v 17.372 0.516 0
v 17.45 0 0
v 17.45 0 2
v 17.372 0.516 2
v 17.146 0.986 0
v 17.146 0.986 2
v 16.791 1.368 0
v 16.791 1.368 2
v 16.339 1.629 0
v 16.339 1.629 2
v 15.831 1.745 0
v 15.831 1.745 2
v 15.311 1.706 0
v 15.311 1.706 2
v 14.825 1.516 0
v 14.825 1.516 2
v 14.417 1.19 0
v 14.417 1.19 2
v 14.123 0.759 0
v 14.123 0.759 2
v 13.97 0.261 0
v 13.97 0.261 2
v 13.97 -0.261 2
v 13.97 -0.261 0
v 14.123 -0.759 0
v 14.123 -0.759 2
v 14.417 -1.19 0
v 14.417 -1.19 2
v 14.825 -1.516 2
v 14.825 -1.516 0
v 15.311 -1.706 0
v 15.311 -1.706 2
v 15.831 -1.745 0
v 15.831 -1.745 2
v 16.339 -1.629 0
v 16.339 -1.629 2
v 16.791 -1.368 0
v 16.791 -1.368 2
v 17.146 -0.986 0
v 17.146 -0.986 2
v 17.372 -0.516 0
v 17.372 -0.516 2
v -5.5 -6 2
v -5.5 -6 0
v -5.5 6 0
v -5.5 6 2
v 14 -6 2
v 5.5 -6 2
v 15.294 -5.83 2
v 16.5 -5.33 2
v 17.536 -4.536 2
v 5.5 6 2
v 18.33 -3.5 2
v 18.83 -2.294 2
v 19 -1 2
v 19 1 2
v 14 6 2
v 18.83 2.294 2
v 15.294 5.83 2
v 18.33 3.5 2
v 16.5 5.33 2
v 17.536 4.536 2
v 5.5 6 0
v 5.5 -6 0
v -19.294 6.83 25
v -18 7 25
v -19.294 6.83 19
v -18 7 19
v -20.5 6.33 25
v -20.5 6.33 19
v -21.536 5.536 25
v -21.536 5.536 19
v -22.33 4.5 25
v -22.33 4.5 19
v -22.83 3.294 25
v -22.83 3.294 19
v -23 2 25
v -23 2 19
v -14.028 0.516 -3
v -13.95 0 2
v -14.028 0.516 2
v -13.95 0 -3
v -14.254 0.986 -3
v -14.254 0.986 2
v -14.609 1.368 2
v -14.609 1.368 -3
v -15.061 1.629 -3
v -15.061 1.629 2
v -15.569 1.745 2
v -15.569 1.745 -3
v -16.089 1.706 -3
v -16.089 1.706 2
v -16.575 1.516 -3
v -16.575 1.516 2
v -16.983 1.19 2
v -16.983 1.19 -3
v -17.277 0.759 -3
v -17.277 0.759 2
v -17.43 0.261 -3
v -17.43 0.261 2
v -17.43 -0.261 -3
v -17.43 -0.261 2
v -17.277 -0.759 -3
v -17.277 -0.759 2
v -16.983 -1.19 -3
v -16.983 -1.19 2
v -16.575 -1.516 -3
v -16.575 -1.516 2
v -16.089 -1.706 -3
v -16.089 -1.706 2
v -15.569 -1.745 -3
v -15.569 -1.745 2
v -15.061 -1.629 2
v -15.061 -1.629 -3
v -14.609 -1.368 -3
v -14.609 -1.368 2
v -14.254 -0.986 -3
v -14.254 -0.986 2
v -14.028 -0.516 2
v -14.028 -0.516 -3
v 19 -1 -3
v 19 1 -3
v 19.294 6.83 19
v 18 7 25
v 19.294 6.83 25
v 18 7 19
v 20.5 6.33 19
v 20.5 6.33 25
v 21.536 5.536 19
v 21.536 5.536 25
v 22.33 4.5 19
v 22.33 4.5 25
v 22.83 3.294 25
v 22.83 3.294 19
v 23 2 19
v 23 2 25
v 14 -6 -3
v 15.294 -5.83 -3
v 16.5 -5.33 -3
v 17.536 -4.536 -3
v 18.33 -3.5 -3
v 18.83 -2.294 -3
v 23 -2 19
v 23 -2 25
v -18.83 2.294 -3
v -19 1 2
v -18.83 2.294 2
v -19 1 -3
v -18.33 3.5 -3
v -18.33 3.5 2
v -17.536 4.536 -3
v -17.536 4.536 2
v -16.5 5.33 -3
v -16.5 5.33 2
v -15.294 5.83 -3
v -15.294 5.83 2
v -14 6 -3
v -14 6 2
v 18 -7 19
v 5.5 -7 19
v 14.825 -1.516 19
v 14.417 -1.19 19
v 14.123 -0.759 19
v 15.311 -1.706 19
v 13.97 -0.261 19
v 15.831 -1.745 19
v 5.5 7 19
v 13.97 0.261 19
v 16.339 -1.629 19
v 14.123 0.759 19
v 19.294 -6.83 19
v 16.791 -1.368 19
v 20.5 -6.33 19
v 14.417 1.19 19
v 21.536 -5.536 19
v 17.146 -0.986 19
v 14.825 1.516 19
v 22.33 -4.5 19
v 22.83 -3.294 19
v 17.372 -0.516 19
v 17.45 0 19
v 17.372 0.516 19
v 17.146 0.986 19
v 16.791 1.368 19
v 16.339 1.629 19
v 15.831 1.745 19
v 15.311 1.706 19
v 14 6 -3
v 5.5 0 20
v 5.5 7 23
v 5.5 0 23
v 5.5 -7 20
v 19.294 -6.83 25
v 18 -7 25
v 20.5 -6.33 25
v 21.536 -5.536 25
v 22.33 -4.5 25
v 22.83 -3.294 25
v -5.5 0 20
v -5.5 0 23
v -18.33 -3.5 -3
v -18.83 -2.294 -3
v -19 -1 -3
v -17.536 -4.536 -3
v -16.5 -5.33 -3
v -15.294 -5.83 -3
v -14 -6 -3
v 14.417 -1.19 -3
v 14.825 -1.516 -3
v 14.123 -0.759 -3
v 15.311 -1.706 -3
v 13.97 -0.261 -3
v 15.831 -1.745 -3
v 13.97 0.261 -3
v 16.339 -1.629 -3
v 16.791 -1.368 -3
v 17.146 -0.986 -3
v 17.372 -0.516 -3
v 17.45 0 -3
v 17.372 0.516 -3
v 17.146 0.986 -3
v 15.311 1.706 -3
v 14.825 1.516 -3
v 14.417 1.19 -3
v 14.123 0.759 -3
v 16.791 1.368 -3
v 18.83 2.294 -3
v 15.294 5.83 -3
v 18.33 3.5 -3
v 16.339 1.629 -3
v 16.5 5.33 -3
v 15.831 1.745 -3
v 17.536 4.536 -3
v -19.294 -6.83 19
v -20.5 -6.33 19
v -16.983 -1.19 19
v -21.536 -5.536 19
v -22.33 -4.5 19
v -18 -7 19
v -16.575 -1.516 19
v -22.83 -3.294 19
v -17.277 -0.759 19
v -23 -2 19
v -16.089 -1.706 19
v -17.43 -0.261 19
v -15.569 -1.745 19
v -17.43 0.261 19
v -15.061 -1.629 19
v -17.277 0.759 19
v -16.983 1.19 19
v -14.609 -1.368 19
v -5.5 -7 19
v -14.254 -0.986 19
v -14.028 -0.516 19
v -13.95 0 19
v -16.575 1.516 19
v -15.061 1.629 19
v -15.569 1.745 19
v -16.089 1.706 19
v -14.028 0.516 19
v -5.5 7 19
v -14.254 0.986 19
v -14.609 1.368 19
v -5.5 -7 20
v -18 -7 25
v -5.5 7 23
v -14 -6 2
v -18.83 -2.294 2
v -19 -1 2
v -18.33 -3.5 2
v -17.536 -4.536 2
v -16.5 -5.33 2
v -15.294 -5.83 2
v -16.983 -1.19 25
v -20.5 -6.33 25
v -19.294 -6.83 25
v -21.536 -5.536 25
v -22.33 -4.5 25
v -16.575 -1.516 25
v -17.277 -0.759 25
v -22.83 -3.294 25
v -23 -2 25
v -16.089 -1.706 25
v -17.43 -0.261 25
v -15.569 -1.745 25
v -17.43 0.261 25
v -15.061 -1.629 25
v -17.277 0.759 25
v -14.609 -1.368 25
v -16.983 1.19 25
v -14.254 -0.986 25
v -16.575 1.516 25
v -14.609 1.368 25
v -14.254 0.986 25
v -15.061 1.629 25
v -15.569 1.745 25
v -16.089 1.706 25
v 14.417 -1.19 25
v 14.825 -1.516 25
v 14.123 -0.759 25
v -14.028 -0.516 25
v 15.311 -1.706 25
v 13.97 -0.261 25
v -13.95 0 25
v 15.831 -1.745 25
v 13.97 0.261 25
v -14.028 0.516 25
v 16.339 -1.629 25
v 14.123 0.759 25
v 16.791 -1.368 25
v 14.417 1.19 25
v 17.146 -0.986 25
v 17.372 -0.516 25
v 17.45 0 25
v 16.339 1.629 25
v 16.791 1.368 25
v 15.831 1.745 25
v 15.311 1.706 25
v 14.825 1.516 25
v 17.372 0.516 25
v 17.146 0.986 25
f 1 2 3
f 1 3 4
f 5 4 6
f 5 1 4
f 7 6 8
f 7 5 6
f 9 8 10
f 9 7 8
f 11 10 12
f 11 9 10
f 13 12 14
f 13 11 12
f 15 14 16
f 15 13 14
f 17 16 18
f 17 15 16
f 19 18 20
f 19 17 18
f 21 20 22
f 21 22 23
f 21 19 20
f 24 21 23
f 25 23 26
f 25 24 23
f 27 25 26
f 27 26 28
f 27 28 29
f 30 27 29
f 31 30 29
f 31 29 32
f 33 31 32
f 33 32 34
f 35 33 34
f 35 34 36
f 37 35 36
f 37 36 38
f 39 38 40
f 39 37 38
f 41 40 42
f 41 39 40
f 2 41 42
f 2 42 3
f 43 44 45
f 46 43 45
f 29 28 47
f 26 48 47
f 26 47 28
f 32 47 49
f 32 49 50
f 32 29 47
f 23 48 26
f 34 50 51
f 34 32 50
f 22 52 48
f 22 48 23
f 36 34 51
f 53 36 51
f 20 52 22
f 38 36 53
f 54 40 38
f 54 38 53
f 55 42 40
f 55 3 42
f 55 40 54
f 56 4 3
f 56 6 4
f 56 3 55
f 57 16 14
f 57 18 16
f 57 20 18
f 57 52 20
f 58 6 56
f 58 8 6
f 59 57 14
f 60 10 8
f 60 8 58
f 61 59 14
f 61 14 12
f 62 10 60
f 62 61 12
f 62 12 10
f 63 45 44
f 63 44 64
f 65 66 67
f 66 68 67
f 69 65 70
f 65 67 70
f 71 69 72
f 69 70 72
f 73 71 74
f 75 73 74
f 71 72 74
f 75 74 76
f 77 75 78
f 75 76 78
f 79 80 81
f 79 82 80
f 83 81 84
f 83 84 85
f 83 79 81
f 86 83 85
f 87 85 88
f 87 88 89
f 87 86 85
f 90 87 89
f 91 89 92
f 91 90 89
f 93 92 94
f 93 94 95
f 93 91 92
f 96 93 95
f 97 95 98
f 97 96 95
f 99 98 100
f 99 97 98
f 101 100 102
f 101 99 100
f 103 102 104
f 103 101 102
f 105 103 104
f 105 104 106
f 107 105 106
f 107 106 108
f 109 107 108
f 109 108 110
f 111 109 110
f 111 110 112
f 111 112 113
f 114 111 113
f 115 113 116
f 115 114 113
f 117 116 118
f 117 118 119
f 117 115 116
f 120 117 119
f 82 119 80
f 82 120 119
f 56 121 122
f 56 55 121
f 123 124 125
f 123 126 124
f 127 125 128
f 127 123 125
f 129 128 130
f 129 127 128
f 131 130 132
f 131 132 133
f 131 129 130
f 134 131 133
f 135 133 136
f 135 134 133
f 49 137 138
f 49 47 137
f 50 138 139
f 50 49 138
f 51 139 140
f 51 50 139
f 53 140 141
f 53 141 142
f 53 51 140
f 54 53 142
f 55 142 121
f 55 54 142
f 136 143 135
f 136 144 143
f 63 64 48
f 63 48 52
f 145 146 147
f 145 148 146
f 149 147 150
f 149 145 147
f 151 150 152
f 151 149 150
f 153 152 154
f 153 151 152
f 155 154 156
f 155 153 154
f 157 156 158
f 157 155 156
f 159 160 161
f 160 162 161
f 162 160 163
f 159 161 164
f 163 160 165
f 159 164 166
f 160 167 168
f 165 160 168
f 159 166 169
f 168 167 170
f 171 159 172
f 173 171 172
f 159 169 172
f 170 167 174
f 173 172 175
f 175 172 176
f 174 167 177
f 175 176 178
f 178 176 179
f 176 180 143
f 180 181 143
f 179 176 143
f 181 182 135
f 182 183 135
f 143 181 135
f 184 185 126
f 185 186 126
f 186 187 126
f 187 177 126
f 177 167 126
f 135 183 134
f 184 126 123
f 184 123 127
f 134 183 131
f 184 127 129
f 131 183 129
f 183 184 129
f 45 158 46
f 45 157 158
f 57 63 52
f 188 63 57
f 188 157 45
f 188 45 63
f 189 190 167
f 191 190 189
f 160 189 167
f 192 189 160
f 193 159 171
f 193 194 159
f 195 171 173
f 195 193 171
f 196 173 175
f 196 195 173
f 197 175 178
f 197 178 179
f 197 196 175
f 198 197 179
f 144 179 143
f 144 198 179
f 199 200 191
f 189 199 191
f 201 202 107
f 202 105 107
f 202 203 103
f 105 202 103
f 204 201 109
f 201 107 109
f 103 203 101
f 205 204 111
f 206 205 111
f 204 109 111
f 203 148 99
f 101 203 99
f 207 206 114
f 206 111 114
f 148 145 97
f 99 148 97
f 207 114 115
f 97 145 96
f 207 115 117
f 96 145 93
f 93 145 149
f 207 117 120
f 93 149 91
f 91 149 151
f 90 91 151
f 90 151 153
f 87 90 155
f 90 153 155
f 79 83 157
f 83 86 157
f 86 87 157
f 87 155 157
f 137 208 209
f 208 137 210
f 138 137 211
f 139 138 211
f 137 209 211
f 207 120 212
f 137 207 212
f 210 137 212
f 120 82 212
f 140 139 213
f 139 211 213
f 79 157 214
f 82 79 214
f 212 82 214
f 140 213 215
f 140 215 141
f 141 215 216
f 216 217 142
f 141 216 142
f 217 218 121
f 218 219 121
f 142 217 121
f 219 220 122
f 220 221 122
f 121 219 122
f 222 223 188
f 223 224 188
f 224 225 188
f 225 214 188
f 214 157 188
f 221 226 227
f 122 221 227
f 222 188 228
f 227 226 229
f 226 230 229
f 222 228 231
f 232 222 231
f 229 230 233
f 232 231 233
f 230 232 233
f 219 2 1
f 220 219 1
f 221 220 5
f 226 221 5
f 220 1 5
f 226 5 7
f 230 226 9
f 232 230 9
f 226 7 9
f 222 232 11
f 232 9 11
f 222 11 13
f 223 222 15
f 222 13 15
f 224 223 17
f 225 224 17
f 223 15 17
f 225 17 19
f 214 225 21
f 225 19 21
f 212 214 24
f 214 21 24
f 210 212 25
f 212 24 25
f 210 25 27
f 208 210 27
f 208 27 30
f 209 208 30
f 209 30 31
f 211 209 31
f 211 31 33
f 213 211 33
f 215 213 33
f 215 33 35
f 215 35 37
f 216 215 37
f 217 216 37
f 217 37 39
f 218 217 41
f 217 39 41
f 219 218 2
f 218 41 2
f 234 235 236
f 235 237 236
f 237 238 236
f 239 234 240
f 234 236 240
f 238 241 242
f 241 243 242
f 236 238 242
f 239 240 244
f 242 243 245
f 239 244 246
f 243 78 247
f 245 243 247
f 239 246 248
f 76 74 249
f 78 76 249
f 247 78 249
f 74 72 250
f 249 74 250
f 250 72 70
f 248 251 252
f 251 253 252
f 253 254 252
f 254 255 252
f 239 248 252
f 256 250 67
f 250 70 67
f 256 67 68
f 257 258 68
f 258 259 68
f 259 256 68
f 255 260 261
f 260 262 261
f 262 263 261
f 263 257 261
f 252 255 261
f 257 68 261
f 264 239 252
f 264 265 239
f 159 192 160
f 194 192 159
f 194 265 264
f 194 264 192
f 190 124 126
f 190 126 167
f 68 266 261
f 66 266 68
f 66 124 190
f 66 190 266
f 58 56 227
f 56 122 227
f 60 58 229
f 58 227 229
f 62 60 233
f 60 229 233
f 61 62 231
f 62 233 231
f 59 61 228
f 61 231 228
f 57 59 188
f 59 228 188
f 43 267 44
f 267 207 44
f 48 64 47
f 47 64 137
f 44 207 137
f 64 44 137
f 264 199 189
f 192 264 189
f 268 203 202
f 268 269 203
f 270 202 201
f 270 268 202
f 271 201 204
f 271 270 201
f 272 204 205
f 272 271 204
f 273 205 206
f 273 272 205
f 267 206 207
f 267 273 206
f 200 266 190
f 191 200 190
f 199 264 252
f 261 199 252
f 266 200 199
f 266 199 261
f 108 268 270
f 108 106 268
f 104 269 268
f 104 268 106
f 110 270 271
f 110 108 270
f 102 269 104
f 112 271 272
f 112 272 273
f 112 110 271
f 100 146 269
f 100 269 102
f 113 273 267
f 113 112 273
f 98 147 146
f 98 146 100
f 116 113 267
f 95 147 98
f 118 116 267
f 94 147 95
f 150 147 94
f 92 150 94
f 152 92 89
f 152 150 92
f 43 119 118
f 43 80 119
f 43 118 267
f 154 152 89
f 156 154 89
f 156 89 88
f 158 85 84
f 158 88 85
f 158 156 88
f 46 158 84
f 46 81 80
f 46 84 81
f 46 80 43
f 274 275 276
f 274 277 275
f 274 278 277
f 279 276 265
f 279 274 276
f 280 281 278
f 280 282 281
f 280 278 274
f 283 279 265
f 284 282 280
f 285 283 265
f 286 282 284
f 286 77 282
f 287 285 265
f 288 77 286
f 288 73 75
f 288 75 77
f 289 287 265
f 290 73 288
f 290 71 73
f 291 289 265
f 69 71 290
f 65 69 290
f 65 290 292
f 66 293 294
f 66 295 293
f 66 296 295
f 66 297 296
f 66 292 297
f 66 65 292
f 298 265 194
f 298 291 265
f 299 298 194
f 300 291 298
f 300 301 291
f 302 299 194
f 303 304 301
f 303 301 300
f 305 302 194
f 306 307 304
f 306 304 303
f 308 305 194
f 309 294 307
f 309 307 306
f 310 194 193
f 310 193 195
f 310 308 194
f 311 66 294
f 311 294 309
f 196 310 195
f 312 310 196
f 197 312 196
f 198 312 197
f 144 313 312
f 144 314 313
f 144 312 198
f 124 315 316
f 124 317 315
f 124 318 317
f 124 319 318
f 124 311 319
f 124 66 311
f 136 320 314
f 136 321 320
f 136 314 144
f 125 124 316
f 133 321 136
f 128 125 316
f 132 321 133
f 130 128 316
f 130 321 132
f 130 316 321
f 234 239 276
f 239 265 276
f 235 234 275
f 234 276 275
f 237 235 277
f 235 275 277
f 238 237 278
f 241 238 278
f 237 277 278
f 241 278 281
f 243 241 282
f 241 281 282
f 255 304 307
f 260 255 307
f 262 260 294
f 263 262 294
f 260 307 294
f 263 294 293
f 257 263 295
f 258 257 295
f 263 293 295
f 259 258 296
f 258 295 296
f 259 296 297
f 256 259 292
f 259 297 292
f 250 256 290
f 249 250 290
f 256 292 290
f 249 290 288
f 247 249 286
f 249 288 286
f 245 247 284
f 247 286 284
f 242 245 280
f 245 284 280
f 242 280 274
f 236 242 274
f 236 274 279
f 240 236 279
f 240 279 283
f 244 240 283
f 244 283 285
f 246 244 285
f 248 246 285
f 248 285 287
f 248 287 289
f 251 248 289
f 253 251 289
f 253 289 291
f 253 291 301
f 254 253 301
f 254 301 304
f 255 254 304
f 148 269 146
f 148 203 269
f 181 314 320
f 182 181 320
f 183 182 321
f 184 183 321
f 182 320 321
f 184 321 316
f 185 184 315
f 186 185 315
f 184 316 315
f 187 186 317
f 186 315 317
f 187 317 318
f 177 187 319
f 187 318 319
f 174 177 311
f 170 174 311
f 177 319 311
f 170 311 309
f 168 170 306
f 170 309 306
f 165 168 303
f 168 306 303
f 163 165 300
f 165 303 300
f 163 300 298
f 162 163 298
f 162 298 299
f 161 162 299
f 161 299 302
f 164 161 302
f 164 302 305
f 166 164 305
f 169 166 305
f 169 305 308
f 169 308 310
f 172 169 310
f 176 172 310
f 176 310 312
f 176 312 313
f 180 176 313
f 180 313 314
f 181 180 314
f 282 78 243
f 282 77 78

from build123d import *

# Parameters (mm, degrees)
F0_W     = 13.5
F0_H     = 12
F0_R     = 1.75
F0_W_2   = 11
F1_DEPTH = 3
F2_DEPTH = 2
F4_R     = 1.75
F4_W     = 11
F4_H     = 7
F5_DEPTH = 2
F6_DEPTH = 6
F7_DEPTH = 5
F8_R     = 5
F8_2_R   = 5


with BuildPart() as f1:
    # F0 (on Top) → F1 (new body)
    with BuildSketch(Plane.XY):
        with Locations((-12.25, 0)):
            Rectangle(F0_W, F0_H)
        with Locations((-15.7, 0)):
            Circle(F0_R, mode=Mode.SUBTRACT)
        Rectangle(F0_W_2, F0_H)
        with Locations((12.25, 0)):
            Rectangle(F0_W, F0_H)
        with Locations((15.7, 0)):
            Circle(F0_R, mode=Mode.SUBTRACT)
    extrude(amount=-F1_DEPTH)

    # F0 (on Top) → F2 (join)
    with BuildSketch(Plane.XY):
        with Locations((-12.25, 0)):
            Rectangle(F0_W, F0_H)
        with Locations((-15.7, 0)):
            Circle(F0_R, mode=Mode.SUBTRACT)
        with Locations((12.25, 0)):
            Rectangle(F0_W, F0_H)
        with Locations((15.7, 0)):
            Circle(F0_R, mode=Mode.SUBTRACT)
    extrude(amount=F2_DEPTH)

    # F8
    f8_edges = [f1.edges().sort_by_distance(p)[0] for p in [
        (-19, -6, -0.5),
        (-19, 6, -0.5),
        (19, -6, -0.5),
        (19, 6, -0.5),
    ]]
    fillet(f8_edges, radius=F8_R)


with BuildPart() as f5:
    # F4 (on offset) → F5 (new body)
    with BuildSketch(Plane.XY.offset(25)):
        Polygon((-5.5, 7), (-23, 7), (-23, -7), (-5.5, -7), (-5.5, 0), align=None)
        with Locations((-15.7, 0)):
            Circle(F4_R, mode=Mode.SUBTRACT)
        with Locations((0, 3.5)):
            Rectangle(F4_W, F4_H)
        with Locations((0, -3.5)):
            Rectangle(F4_W, F4_H)
        Polygon((23, 7), (5.5, 7), (5.5, 0), (5.5, -7), (23, -7), align=None)
        with Locations((15.7, 0)):
            Circle(F4_R, mode=Mode.SUBTRACT)
    extrude(amount=-F5_DEPTH)

    # F4 (on offset) → F6 (join)
    with BuildSketch(Plane.XY.offset(25)):
        Polygon((-5.5, 7), (-23, 7), (-23, -7), (-5.5, -7), (-5.5, 0), align=None)
        with Locations((-15.7, 0)):
            Circle(F4_R, mode=Mode.SUBTRACT)
        Polygon((23, 7), (5.5, 7), (5.5, 0), (5.5, -7), (23, -7), align=None)
        with Locations((15.7, 0)):
            Circle(F4_R, mode=Mode.SUBTRACT)
    extrude(amount=-F6_DEPTH)

    # F4 (on offset) → F7 (join)
    with BuildSketch(Plane.XY.offset(25)):
        with Locations((0, -3.5)):
            Rectangle(F4_W, F4_H)
    extrude(amount=-F7_DEPTH)

    # F8#2
    f8_2_edges = [f5.edges().sort_by_distance(p)[0] for p in [
        (-23, 7, 22),
        (-23, -7, 22),
        (23, 7, 22),
        (23, -7, 22),
    ]]
    fillet(f8_2_edges, radius=F8_2_R)


solid = Compound([f1.part, f5.part])
